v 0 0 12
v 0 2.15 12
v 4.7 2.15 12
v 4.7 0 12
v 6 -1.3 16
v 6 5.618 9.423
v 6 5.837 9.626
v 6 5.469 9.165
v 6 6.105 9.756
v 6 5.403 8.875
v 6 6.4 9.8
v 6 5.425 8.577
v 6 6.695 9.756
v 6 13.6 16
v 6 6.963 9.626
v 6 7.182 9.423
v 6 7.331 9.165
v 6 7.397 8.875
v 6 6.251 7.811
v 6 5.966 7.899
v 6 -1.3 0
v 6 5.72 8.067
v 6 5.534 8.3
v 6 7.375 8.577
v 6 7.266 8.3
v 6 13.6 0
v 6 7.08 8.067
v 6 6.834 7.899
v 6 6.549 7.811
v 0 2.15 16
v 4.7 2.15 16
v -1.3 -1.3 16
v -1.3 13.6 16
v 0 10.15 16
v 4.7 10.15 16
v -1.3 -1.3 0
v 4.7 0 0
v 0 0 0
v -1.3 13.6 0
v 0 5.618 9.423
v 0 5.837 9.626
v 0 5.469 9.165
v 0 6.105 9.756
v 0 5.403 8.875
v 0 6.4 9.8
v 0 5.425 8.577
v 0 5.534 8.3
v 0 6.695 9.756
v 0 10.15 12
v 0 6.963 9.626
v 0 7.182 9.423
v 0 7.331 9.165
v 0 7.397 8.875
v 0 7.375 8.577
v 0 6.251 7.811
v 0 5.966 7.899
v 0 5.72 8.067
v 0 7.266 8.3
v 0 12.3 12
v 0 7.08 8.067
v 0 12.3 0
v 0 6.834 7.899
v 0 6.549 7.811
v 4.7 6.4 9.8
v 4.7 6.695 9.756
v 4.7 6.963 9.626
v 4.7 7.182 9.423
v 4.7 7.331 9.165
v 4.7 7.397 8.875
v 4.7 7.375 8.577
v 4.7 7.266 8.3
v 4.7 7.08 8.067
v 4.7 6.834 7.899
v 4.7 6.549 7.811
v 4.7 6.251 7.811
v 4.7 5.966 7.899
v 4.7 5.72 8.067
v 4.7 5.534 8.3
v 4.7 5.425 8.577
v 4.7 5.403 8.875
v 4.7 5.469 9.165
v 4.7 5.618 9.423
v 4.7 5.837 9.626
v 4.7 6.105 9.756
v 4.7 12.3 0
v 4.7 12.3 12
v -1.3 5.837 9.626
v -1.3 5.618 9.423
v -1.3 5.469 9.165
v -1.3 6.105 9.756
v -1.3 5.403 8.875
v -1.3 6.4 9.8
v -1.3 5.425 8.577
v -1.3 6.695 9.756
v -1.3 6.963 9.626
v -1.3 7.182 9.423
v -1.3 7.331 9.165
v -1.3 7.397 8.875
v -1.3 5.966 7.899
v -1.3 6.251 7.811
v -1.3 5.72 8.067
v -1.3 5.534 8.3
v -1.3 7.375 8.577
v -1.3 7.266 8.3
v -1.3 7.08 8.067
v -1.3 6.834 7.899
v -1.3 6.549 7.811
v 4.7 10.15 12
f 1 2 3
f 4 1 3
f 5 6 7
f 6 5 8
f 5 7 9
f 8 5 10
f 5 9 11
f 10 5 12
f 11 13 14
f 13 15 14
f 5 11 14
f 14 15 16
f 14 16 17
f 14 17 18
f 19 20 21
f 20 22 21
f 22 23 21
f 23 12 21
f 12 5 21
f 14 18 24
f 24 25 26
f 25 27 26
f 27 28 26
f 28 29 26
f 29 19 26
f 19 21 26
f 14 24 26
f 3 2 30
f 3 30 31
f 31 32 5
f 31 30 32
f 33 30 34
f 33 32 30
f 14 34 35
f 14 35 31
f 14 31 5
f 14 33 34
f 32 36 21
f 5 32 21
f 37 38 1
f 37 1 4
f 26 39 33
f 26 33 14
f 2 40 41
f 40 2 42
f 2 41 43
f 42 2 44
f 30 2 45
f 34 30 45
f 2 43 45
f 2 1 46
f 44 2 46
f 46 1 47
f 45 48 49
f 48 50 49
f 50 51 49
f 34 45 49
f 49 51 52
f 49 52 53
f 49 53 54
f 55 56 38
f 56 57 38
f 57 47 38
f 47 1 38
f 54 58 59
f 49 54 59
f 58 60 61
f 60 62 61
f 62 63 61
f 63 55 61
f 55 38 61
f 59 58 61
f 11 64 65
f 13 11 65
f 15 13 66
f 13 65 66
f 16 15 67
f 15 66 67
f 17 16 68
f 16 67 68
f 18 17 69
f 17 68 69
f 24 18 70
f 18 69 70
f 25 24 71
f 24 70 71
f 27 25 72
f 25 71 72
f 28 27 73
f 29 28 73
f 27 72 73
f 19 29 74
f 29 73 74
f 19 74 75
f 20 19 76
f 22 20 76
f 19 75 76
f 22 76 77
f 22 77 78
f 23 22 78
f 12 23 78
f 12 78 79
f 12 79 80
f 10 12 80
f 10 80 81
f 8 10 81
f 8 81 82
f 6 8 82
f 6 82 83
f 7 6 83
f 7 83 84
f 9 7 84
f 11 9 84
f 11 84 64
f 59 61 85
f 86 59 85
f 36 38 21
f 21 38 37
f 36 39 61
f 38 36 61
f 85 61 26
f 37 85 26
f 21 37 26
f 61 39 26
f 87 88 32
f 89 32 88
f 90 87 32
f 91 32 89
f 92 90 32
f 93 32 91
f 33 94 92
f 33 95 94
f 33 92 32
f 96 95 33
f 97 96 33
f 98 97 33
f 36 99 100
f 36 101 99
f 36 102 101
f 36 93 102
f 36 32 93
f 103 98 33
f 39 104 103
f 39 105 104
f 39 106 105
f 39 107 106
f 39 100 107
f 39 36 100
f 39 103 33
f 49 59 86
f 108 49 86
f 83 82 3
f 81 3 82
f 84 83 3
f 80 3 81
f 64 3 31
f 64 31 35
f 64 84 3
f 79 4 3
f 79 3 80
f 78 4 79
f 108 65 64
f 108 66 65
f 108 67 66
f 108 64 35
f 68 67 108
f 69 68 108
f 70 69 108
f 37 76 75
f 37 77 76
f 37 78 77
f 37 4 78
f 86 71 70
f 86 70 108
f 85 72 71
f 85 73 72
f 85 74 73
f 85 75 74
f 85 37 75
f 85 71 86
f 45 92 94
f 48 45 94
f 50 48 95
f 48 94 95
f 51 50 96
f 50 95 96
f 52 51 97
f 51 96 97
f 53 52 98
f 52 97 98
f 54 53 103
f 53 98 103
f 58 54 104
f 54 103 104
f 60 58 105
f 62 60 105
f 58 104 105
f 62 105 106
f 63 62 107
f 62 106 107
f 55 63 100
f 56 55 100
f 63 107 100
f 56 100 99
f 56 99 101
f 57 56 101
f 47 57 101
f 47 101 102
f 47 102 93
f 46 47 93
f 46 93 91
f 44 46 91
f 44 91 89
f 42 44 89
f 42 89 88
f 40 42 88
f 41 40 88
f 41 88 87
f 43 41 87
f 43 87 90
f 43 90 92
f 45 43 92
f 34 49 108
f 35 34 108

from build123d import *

# Parameters (mm, degrees)
SKETCH1_W           = 7.3
SKETCH1_H           = 14.9
SKETCH1_W_2         = 4.7
SKETCH1_H_2         = 12.3
BOSS_EXTRUDE1_DEPTH = 16
BOSS_EXTRUDE2_START = 12
SKETCH4_W           = 4.7
SKETCH4_H           = 2.15
BOSS_EXTRUDE2_DEPTH = 4
SKETCH5_R           = 1
CUT_EXTRUDE1_DEPTH  = 15


with BuildPart() as part:
    # Sketch1 → Boss-Extrude1 (new body)
    with BuildSketch(Plane.XY):
        with Locations((2.35, 6.15)):
            Rectangle(SKETCH1_W, SKETCH1_H)
        with Locations((2.35, 6.15)):
            Rectangle(SKETCH1_W_2, SKETCH1_H_2, mode=Mode.SUBTRACT)
    extrude(amount=BOSS_EXTRUDE1_DEPTH)

    # Sketch4 → Boss-Extrude2 (add)
    with BuildSketch(Plane.XY.offset(BOSS_EXTRUDE2_START)):
        with Locations((2.35, 1.075)):
            Rectangle(SKETCH4_W, SKETCH4_H)
        with Locations((2.35, 11.225)):
            Rectangle(SKETCH4_W, SKETCH4_H)
    extrude(amount=BOSS_EXTRUDE2_DEPTH)

    # Sketch5 → Cut-Extrude1 (cut)
    with BuildSketch(Plane.ZY.offset(1.3)):
        with Locations((8.8, 6.4)):
            Circle(SKETCH5_R)
    extrude(amount=-CUT_EXTRUDE1_DEPTH, mode=Mode.SUBTRACT)


solid = part.part
